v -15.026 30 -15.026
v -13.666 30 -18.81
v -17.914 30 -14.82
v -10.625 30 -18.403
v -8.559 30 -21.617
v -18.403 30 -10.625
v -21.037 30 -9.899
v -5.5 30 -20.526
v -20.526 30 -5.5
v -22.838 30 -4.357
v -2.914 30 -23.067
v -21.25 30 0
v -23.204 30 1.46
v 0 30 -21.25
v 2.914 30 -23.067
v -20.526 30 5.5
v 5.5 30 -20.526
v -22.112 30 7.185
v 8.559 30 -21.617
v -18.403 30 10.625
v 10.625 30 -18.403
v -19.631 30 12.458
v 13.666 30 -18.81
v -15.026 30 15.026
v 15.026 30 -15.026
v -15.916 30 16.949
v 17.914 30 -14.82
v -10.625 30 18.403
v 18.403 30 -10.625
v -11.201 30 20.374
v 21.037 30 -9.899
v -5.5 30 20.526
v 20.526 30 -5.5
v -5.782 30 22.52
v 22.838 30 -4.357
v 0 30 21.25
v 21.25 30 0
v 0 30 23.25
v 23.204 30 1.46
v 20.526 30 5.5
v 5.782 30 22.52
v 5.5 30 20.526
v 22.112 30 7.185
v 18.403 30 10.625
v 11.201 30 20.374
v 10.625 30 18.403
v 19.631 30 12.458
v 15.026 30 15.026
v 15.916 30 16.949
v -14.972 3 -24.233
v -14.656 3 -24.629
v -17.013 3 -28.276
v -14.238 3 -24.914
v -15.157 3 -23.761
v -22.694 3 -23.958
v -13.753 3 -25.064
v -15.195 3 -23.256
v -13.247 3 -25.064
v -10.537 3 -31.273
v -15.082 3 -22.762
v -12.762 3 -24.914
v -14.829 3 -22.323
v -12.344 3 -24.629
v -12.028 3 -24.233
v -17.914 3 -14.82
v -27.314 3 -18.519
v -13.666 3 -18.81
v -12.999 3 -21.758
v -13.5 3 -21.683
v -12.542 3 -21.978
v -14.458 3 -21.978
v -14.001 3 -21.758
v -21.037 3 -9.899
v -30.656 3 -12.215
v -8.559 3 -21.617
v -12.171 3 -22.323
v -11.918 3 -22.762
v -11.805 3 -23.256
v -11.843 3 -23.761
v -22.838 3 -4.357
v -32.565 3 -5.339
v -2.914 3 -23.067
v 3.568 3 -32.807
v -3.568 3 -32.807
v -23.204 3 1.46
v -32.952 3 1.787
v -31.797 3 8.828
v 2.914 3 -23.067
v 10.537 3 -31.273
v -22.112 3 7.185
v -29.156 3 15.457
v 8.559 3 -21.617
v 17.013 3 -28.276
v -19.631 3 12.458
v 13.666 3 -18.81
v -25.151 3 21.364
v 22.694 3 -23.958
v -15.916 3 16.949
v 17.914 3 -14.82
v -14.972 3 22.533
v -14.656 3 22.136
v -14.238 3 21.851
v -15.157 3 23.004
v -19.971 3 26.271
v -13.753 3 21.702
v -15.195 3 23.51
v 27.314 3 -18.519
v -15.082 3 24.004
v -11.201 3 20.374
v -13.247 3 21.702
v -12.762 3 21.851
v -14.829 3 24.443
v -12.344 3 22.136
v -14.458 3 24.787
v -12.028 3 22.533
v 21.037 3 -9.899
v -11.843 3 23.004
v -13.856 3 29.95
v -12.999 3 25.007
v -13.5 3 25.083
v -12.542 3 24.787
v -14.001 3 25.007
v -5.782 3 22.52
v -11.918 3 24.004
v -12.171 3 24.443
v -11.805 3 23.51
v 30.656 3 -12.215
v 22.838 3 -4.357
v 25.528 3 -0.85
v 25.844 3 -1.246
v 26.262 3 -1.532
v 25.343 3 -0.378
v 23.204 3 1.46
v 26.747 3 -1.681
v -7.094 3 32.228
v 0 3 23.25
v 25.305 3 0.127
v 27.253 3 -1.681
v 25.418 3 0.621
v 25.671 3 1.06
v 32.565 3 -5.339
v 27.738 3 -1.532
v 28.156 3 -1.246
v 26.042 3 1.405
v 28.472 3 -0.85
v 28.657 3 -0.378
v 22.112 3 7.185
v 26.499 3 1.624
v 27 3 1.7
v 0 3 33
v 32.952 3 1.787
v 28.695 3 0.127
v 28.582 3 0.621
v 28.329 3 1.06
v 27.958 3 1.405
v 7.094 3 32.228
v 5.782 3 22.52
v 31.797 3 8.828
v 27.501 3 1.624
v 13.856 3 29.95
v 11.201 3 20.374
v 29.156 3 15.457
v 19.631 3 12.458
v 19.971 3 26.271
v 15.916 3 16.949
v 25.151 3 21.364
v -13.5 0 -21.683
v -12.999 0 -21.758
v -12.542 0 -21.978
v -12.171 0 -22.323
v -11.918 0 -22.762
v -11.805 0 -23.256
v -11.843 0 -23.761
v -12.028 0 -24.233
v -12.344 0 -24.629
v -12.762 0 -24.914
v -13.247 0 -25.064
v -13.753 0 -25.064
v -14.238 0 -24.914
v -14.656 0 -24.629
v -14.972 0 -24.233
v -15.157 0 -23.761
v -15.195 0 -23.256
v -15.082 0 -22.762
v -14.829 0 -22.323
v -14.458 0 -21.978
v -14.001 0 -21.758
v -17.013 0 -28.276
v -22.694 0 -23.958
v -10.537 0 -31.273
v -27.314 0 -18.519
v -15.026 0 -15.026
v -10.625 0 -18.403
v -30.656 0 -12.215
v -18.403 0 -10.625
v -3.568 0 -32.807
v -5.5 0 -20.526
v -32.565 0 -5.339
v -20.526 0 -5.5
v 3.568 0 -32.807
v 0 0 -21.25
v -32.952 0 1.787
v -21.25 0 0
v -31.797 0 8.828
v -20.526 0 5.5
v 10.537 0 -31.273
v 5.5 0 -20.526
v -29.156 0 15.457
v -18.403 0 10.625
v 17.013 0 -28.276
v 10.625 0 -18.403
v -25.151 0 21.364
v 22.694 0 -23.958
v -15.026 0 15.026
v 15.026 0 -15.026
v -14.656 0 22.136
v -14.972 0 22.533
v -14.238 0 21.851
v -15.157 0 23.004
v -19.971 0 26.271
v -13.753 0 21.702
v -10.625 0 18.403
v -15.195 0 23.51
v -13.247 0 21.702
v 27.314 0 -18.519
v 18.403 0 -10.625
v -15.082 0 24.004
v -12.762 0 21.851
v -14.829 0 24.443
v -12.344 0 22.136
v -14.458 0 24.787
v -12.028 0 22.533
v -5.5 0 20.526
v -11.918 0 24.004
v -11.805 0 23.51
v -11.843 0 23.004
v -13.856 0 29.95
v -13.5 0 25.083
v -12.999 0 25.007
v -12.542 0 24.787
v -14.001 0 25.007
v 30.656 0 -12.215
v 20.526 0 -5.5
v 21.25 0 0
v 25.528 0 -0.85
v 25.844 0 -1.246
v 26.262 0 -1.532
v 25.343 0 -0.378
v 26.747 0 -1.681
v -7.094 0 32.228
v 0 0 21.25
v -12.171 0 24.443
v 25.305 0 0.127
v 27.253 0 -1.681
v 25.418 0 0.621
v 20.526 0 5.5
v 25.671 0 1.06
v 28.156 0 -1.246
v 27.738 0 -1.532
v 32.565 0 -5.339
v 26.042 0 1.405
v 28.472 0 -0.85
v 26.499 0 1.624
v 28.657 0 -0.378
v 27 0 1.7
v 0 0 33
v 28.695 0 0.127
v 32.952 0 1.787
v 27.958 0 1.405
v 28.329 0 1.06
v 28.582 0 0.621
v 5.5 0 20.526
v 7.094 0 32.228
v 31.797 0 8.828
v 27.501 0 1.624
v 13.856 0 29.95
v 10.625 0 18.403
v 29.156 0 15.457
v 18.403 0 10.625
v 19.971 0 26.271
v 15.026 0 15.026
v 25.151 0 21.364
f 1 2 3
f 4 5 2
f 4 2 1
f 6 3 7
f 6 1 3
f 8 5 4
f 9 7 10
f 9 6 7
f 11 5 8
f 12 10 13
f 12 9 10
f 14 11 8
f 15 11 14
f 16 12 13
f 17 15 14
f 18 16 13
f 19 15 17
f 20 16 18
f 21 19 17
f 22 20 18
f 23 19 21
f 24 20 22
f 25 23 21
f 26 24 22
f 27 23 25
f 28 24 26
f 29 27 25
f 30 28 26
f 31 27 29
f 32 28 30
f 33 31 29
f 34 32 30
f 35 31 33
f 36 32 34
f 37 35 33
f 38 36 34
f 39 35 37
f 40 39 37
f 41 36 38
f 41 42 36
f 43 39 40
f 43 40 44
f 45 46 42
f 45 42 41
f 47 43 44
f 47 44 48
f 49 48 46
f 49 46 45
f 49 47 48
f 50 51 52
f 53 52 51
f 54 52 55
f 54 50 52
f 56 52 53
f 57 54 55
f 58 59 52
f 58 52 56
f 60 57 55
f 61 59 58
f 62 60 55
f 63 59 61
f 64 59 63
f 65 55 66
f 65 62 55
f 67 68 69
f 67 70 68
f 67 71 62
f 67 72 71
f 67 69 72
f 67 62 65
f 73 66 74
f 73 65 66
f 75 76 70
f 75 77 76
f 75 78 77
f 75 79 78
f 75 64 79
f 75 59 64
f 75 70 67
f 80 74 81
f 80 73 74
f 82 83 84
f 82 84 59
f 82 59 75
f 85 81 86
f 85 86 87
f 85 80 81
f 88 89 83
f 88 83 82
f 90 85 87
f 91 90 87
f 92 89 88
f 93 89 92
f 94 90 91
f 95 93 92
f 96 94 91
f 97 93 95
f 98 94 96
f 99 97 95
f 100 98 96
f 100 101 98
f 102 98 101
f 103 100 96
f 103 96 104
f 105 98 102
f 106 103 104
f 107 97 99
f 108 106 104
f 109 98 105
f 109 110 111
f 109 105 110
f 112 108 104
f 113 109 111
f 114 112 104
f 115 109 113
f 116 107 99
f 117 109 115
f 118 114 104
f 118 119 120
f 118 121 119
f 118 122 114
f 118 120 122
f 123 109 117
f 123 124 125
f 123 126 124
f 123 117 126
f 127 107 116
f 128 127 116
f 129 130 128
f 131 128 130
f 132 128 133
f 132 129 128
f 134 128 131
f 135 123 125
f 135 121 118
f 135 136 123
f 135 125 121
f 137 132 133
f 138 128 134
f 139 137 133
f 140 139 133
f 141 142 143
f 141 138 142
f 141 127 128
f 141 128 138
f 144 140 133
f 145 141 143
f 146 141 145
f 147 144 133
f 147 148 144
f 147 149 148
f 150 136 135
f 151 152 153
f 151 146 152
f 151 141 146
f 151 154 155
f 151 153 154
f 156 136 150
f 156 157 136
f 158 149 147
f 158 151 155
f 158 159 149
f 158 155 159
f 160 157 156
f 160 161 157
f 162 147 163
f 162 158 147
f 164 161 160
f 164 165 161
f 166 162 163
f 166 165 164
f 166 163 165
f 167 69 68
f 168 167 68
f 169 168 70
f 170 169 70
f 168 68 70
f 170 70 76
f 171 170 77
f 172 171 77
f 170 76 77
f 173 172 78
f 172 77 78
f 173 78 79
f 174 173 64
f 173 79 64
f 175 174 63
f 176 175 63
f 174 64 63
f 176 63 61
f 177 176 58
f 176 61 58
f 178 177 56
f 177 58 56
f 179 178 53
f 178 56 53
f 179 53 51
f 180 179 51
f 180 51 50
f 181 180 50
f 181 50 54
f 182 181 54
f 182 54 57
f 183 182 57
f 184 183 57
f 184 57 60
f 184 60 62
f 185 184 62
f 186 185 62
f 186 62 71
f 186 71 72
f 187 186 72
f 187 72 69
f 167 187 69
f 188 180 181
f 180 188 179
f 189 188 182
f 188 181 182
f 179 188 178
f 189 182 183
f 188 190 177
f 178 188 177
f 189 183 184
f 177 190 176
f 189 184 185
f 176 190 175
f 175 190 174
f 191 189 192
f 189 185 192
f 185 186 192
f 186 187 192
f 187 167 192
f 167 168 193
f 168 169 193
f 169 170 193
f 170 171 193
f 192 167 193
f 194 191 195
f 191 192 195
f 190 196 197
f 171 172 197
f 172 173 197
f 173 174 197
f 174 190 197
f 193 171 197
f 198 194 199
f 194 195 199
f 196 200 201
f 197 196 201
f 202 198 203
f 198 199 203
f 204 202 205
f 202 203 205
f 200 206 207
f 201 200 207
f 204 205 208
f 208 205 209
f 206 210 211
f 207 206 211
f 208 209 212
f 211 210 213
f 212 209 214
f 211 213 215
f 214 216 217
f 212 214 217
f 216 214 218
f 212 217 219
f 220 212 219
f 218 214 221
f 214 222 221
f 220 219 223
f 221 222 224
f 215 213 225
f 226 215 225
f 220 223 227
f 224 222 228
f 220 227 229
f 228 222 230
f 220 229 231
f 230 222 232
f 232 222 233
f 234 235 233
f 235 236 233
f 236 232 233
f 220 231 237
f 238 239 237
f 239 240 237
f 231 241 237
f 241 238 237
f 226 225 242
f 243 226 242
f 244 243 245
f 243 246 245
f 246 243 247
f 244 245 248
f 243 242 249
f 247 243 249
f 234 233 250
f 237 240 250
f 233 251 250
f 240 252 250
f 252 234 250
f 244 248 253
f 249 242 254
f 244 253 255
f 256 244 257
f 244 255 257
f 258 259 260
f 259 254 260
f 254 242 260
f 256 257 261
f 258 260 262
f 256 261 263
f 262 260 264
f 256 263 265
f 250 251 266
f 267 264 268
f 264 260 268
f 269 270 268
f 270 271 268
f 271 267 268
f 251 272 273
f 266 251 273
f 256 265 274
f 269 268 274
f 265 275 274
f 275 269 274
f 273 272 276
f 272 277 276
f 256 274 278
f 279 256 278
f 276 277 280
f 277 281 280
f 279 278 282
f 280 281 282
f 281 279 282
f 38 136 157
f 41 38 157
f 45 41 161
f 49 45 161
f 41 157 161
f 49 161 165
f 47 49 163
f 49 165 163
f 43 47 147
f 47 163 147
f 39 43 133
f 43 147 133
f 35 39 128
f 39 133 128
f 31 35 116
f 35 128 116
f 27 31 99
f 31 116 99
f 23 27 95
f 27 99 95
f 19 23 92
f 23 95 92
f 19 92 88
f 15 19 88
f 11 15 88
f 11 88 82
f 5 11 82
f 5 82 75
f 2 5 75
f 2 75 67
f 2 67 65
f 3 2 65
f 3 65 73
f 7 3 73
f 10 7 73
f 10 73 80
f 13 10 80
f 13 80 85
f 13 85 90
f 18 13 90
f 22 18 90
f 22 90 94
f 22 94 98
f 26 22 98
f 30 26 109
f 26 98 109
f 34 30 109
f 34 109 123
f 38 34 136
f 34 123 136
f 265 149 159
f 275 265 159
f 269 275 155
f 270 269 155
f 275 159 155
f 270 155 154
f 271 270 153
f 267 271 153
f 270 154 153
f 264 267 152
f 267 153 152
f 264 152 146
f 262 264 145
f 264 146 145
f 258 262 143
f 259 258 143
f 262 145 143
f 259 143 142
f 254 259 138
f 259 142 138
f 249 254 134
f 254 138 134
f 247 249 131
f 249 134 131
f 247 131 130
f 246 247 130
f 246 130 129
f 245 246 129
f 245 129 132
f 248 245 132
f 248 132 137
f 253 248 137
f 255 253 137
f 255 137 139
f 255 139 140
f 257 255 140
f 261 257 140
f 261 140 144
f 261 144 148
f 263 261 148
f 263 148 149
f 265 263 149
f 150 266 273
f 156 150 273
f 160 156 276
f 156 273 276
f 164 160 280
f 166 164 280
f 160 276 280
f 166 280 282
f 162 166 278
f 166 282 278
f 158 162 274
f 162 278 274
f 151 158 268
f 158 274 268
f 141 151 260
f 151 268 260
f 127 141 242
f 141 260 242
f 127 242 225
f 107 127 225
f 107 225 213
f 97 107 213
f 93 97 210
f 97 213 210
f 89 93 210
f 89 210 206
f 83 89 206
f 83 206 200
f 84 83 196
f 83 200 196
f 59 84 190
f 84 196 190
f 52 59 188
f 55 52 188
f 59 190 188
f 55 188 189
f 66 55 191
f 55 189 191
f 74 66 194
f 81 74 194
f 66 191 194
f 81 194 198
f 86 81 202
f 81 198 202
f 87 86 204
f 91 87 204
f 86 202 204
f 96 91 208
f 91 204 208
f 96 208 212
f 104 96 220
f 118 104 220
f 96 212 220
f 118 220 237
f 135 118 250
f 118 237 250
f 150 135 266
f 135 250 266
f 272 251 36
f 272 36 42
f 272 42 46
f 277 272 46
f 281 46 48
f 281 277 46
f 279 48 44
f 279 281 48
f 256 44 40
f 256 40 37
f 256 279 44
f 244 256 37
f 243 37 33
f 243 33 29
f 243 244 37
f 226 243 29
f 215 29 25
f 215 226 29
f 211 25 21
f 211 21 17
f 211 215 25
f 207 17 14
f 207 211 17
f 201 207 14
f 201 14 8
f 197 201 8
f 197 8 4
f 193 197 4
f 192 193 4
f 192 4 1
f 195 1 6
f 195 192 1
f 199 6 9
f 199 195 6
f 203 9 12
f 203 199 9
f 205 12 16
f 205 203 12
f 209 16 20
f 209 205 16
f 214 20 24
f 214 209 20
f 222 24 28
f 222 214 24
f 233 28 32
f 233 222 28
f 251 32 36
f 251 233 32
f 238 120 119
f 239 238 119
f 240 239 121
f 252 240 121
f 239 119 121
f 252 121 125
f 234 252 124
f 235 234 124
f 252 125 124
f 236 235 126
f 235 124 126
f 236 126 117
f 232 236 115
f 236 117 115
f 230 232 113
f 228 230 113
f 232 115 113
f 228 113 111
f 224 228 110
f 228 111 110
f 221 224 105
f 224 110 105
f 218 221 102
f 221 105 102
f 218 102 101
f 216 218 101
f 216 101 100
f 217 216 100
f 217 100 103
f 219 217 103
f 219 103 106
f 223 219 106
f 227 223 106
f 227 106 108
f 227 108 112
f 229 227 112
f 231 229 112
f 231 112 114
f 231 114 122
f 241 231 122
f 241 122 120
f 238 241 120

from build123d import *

# Parameters (mm, degrees)
SKETCH1_R           = 23.25
SKETCH1_R_2         = 21.25
BOSS_EXTRUDE1_DEPTH = 30
SKETCH1_4_R         = 33
SKETCH1_4_R_2       = 23.25
BOSS_EXTRUDE2_DEPTH = 3
SKETCH2_R           = 1.7
CUT_EXTRUDE1_DEPTH  = 54.916602267


with BuildPart() as part:
    # Sketch1 → Boss-Extrude1 (new body)
    with BuildSketch(Plane(origin=(0, 0, 0), x_dir=(1, 0, 0), z_dir=(0, 1, 0))):
        Circle(SKETCH1_R)
        Circle(SKETCH1_R_2, mode=Mode.SUBTRACT)
    extrude(amount=BOSS_EXTRUDE1_DEPTH)

    # Sketch1<4> → Boss-Extrude2 (add)
    with BuildSketch(Plane(origin=(0, 0, 0), x_dir=(1, 0, 0), z_dir=(0, 1, 0))):
        Circle(SKETCH1_4_R)
        Circle(SKETCH1_4_R_2, mode=Mode.SUBTRACT)
    extrude(amount=BOSS_EXTRUDE2_DEPTH)

    # Sketch2 → Cut-Extrude1 (cut, through all)
    with BuildSketch(Plane(origin=(0, 3, 0), x_dir=(1, 0, 0), z_dir=(0, 1, 0))):
        with Locations((27, 0)):
            Circle(SKETCH2_R)
        with Locations((-13.5, -23.382685902)):
            Circle(SKETCH2_R)
        with Locations((-13.5, 23.382685902)):
            Circle(SKETCH2_R)
    extrude(amount=-CUT_EXTRUDE1_DEPTH, mode=Mode.SUBTRACT)


solid = part.part
